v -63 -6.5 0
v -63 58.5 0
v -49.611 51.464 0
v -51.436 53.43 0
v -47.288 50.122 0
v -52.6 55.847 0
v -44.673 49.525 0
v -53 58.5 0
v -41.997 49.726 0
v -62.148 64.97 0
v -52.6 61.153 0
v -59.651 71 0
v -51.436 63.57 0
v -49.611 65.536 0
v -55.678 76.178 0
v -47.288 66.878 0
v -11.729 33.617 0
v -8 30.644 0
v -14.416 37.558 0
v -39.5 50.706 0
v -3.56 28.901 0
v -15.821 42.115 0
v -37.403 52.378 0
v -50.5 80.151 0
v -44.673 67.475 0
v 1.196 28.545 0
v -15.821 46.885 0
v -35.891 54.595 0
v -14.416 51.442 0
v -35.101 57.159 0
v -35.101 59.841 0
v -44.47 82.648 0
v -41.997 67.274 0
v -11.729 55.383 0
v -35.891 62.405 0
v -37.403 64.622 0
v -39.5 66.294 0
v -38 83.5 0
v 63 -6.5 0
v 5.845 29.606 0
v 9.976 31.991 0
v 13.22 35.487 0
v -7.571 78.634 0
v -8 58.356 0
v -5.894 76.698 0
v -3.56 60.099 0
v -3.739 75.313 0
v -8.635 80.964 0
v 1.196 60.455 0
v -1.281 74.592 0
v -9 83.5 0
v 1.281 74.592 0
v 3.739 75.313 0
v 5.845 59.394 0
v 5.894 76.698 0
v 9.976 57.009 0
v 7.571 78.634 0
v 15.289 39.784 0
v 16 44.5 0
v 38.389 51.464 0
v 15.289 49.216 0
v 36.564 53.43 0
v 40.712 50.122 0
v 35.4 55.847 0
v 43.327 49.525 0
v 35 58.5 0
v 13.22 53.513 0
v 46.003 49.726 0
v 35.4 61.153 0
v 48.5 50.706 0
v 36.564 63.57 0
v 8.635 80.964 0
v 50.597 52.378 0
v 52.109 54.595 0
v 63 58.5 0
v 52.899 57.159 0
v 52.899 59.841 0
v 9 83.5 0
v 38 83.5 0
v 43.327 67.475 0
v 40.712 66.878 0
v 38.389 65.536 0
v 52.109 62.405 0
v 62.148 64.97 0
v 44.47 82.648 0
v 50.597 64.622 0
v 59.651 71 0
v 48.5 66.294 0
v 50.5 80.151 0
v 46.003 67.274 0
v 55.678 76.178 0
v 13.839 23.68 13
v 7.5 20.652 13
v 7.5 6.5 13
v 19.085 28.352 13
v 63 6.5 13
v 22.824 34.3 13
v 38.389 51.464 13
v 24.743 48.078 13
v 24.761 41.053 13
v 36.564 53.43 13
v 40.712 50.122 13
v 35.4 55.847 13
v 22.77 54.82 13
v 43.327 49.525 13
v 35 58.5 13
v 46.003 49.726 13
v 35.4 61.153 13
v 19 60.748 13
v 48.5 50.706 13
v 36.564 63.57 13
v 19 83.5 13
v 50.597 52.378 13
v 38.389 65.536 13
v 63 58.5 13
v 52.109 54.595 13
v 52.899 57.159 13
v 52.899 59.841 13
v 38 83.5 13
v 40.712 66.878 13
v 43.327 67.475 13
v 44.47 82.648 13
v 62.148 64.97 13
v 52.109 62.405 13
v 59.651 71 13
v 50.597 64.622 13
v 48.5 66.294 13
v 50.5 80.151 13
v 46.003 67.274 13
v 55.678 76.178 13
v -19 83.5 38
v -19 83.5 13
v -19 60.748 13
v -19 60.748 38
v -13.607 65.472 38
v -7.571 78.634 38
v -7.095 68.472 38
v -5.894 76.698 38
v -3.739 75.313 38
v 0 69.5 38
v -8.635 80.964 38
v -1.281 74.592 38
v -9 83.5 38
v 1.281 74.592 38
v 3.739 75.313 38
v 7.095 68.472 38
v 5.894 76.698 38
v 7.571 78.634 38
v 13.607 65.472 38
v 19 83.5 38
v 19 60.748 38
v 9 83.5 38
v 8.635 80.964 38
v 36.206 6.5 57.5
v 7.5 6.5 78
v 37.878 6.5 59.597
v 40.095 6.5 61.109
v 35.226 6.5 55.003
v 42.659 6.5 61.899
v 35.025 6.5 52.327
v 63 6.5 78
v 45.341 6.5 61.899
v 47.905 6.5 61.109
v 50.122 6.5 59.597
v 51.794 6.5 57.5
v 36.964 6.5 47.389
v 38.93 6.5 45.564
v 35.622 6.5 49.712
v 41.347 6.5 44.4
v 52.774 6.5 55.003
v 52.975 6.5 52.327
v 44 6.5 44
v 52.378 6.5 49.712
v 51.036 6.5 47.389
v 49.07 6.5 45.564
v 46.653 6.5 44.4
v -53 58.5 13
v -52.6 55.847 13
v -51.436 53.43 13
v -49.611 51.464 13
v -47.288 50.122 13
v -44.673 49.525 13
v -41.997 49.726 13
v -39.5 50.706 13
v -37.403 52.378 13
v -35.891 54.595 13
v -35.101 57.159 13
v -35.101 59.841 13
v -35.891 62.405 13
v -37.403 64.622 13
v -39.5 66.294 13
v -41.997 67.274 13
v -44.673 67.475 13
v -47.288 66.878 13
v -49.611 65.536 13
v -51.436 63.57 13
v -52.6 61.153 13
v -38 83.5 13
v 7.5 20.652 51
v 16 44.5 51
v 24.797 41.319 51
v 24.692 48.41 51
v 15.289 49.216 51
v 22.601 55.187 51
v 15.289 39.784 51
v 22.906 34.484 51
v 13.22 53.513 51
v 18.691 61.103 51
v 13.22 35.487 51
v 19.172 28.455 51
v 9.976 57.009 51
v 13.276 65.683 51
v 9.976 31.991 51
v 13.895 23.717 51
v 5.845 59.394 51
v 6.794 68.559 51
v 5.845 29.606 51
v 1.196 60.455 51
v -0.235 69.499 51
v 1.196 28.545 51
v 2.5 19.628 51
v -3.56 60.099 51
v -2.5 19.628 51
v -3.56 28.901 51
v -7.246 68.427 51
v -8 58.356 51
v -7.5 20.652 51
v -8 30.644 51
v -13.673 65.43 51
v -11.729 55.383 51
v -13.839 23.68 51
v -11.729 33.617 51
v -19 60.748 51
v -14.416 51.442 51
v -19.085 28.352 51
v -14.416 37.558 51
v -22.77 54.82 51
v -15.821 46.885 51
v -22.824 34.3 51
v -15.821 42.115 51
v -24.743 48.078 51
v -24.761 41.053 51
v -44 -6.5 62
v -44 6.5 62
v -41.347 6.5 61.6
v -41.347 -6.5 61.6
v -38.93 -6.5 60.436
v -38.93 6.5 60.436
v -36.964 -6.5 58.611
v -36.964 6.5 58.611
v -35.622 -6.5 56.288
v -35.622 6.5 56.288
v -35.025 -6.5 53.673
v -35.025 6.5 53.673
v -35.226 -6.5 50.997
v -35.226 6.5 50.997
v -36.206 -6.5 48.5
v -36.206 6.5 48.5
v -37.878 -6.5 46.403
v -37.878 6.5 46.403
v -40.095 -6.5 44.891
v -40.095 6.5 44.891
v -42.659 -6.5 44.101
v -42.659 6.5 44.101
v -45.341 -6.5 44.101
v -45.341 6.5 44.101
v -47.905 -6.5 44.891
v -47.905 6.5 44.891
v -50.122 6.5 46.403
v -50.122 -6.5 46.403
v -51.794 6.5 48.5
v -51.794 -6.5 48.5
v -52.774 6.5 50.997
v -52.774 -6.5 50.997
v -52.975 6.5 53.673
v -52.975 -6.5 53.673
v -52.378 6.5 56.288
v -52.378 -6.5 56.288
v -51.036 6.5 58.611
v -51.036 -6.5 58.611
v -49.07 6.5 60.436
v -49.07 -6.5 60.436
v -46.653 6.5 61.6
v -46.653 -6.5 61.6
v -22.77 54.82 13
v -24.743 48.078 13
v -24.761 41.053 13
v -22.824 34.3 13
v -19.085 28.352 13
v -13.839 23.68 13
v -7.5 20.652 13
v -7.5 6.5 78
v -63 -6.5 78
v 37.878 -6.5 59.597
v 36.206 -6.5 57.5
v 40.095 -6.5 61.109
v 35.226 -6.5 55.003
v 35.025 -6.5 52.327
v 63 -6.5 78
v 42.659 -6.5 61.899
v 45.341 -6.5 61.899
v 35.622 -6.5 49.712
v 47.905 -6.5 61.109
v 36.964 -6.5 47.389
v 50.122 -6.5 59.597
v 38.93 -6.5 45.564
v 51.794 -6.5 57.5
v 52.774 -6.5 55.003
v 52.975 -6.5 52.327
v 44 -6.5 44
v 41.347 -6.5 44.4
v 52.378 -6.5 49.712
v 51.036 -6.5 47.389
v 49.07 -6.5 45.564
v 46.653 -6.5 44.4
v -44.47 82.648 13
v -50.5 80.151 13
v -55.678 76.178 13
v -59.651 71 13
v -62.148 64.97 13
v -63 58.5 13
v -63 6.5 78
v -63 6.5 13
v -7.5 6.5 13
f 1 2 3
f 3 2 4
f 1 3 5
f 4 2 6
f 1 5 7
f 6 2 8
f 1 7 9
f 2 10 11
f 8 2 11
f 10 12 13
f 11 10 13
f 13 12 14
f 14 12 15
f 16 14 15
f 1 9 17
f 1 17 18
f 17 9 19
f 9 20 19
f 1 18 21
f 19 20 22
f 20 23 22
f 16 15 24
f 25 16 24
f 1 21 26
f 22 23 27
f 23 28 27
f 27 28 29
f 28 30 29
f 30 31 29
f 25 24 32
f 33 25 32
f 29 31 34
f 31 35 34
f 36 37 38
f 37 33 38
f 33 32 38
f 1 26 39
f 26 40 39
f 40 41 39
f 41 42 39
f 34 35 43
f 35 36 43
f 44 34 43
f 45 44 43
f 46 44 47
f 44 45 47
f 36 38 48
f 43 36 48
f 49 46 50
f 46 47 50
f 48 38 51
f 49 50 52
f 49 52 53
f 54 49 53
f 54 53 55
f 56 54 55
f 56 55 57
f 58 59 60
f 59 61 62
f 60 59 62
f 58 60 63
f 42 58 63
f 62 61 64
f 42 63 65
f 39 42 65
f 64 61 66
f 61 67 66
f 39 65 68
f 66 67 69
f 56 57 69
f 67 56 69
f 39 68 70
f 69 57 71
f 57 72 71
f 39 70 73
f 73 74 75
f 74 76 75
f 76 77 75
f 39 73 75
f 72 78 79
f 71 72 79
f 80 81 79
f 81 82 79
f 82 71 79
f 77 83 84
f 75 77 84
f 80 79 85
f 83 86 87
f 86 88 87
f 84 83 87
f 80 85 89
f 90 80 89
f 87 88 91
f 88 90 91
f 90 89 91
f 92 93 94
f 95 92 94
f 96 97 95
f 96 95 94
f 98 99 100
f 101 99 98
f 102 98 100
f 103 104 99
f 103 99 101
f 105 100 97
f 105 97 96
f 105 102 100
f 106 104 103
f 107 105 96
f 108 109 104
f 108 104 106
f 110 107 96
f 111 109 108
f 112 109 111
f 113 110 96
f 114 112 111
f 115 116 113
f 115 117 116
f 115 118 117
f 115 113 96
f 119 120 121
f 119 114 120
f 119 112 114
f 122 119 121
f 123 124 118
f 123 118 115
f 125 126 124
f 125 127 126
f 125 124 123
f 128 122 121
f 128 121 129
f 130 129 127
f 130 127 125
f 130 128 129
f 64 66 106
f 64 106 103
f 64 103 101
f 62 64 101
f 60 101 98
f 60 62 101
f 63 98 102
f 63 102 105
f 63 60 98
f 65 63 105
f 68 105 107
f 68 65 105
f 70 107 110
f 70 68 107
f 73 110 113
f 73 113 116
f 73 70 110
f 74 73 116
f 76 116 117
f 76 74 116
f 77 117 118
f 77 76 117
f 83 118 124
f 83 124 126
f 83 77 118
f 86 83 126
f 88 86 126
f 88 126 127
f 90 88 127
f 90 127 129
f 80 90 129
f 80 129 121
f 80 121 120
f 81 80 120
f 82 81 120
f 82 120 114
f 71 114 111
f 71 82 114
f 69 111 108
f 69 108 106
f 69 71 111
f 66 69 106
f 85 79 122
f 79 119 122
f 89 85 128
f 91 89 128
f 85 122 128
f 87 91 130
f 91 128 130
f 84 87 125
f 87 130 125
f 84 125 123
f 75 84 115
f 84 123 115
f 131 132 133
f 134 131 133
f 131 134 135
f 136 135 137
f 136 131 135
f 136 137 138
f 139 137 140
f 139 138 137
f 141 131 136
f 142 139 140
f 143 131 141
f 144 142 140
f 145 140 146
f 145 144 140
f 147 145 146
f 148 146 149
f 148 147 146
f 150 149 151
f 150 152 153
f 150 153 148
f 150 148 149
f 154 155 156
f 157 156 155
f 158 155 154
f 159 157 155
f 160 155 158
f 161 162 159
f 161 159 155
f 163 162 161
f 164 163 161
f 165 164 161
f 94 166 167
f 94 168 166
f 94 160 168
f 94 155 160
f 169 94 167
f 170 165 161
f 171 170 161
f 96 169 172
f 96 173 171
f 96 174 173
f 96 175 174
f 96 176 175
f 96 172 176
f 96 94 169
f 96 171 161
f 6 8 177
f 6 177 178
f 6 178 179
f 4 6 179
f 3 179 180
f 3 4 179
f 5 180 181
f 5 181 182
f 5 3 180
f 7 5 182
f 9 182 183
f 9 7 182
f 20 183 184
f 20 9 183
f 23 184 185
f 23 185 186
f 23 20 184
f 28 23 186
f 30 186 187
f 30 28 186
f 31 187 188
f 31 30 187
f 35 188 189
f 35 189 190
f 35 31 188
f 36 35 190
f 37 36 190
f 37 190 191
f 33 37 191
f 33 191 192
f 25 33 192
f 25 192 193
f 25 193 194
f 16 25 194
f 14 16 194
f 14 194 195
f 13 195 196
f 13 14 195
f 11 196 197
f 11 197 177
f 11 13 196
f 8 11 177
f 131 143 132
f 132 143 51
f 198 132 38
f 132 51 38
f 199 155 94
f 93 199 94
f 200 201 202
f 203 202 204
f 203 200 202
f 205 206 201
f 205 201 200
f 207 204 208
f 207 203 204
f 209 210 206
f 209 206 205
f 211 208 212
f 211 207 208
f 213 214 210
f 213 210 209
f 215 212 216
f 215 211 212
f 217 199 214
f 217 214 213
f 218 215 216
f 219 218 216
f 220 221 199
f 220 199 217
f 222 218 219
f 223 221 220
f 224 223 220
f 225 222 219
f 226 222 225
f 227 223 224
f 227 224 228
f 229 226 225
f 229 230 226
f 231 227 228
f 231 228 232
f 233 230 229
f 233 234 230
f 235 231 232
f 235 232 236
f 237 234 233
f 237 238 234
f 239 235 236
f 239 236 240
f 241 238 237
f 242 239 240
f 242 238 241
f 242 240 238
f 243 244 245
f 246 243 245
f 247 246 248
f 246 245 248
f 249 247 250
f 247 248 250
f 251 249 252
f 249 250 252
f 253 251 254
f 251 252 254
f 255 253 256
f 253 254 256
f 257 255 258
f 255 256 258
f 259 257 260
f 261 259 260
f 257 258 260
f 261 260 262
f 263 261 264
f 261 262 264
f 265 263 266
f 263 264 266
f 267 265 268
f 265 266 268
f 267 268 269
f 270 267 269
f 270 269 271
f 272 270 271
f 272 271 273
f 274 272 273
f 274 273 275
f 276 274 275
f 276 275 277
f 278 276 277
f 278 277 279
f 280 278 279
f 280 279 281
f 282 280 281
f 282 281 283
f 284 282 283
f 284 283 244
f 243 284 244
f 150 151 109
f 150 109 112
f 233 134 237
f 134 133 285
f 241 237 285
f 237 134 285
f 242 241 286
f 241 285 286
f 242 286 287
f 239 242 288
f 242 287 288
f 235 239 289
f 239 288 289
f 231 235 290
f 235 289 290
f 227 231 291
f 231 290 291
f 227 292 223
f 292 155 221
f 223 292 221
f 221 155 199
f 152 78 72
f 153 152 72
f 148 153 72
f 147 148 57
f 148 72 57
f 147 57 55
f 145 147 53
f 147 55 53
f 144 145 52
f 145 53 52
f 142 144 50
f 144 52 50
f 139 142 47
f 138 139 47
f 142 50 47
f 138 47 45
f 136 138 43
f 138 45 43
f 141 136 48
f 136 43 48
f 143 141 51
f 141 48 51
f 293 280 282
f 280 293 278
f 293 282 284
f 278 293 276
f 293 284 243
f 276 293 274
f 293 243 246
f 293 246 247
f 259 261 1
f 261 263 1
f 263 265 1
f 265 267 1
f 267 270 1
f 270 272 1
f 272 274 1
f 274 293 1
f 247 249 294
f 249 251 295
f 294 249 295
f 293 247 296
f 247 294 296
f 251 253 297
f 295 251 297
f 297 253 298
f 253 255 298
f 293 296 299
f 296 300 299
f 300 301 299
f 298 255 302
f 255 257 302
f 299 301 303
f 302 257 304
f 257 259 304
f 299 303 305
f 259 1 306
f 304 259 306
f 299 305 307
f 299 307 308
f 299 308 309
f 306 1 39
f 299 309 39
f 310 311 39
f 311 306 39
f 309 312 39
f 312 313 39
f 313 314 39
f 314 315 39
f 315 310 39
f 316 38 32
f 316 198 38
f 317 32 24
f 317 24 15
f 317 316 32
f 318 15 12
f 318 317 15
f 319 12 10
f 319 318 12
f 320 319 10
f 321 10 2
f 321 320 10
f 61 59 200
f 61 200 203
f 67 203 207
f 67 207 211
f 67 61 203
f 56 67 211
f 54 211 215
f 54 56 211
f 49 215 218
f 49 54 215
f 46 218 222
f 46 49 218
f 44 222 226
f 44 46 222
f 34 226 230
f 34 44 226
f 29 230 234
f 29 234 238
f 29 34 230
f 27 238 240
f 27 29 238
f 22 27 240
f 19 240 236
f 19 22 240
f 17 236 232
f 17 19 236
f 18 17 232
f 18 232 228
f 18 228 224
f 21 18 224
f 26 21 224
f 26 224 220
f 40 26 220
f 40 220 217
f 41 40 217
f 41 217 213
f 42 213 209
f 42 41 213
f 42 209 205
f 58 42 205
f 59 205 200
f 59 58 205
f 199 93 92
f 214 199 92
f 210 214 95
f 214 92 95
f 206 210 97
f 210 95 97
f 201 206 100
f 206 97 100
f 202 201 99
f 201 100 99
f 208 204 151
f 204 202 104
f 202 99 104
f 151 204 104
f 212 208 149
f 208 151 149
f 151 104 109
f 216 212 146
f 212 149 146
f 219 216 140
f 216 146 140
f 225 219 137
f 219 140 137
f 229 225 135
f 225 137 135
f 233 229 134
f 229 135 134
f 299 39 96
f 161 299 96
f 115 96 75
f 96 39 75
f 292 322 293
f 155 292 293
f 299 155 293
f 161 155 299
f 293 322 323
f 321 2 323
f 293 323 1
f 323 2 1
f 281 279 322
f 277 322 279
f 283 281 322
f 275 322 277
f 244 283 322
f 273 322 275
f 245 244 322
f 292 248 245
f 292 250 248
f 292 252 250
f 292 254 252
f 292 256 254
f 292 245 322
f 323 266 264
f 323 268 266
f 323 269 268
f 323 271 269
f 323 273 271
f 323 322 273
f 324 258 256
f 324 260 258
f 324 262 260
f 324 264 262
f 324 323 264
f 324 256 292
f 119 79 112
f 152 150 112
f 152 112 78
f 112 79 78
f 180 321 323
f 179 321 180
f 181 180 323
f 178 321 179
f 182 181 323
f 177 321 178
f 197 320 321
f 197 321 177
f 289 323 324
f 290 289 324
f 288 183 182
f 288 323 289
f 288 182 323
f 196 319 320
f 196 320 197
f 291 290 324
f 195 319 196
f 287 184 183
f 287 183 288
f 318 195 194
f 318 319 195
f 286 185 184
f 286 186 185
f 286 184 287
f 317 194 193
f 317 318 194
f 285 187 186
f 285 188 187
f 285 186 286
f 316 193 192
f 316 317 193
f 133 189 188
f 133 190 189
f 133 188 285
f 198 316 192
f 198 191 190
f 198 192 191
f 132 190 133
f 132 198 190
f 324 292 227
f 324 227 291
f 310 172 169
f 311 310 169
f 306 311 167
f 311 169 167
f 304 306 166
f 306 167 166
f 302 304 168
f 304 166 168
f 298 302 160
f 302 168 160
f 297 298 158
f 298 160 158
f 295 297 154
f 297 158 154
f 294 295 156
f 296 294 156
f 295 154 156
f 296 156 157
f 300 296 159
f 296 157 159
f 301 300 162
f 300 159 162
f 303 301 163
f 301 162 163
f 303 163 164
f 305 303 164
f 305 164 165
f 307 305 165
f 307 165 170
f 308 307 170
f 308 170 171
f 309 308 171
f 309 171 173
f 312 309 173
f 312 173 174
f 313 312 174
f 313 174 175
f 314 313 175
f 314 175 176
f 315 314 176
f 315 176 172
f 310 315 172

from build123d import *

# Parameters (mm, degrees)
SKETCH1_W           = 126
SKETCH1_H           = 13
BOSS_EXTRUDE1_DEPTH = 78
SKETCH1_3_R         = 9
BOSS_EXTRUDE2_DEPTH = 13
SKETCH1_4_R         = 25
SKETCH1_4_R_2       = 16
BOSS_EXTRUDE3_DEPTH = 51
BOSS_EXTRUDE4_DEPTH = 38
SKETCH2_R           = 9
CUT_EXTRUDE1_DEPTH  = 127.419935137
FILLET1_R           = 25


with BuildPart() as part:
    # Sketch1 → Boss-Extrude1 (new body)
    with BuildSketch(Plane.XY):
        Rectangle(SKETCH1_W, SKETCH1_H)
    extrude(amount=BOSS_EXTRUDE1_DEPTH)

    # Sketch1<3> → Boss-Extrude2 (add)
    with BuildSketch(Plane.XY):
        with BuildLine():
            Line((-63, 83.5), (-63, 6.5))
            Line((-63, 6.5), (63, 6.5))
            Line((63, 6.5), (63, 83.5))
            Line((63, 83.5), (19, 83.5))
            Line((19, 83.5), (19, 60.748076809))
            ThreePointArc((19, 60.748076809), (23.452078799, 53.160254038), (25, 44.5))
            ThreePointArc((25, 44.5), (-8.660254038, 21.047921201), (-19, 60.748076809))
            Line((-19, 60.748076809), (-19, 83.5))
            Line((-19, 83.5), (-63, 83.5))
        make_face()
        with Locations(Location((-44, 58.5, 0), (0, 0, 180))):
            Circle(SKETCH1_3_R, mode=Mode.SUBTRACT)
        with Locations(Location((44, 58.5, 0), (0, 0, 180))):
            Circle(SKETCH1_3_R, mode=Mode.SUBTRACT)
    extrude(amount=BOSS_EXTRUDE2_DEPTH)

    # Sketch1<4> → Boss-Extrude3 (add)
    with BuildSketch(Plane.XY):
        with Locations(Location((0, 44.5, 0), (0, 0, 139.464197889))):
            Circle(SKETCH1_4_R)
        with Locations((0, 44.5)):
            Circle(SKETCH1_4_R_2, mode=Mode.SUBTRACT)
    extrude(amount=BOSS_EXTRUDE3_DEPTH)

    # Sketch1<5> → Boss-Extrude4 (add)
    with BuildSketch(Plane.XY):
        with BuildLine():
            Line((-9, 83.5), (-19, 83.5))
            Line((-19, 83.5), (-19, 60.748076809))
            ThreePointArc((-19, 60.748076809), (0, 69.5), (19, 60.748076809))
            Line((19, 60.748076809), (19, 83.5))
            Line((19, 83.5), (9, 83.5))
            ThreePointArc((9, 83.5), (0, 74.5), (-9, 83.5))
        make_face()
    extrude(amount=BOSS_EXTRUDE4_DEPTH)

    # Sketch2 → Cut-Extrude1 (cut, through all)
    with BuildSketch(Plane(origin=(0, 6.5, 0), x_dir=(1, 0, 0), z_dir=(0, 1, 0))):
        with Locations(Location((-44, -53, 0), (0, 0, 270))):
            Circle(SKETCH2_R)
        with Locations(Location((44, -53, 0), (0, 0, 90))):
            Circle(SKETCH2_R)
    extrude(amount=-CUT_EXTRUDE1_DEPTH, mode=Mode.SUBTRACT)

    # Fillet1
    fillet1_edges = [part.edges().sort_by_distance(p)[0] for p in [
        (-63, 83.5, 6.5),
        (63, 83.5, 6.5),
    ]]
    fillet(fillet1_edges, radius=FILLET1_R)

    # Sketch4 → Loft4 section 0
    with BuildSketch(Plane(origin=(-7.5, 0, 0), x_dir=(0, 0, -1), z_dir=(1, 0, 0))):
        with BuildLine():
            Line((-78, 6.5), (-51, 20.651519965))
            Line((-51, 20.651519965), (-13, 20.651519965))
            Line((-13, 20.651519965), (-13, 6.5))
            Line((-13, 6.5), (-78, 6.5))
        make_face()
    # Sketch6 → Loft4 section 1
    with BuildSketch(Plane(origin=(0, 0, 0), x_dir=(0, 0, -1), z_dir=(1, 0, 0))):
        with BuildLine():
            Line((-78, 6.5), (-51, 19.5))
            Line((-51, 19.5), (-13, 19.5))
            Line((-13, 19.5), (-13, 6.5))
            Line((-13, 6.5), (-78, 6.5))
        make_face()
    # Sketch5 → Loft4 section 2
    with BuildSketch(Plane(origin=(7.5, 0, 0), x_dir=(0, 0, -1), z_dir=(1, 0, 0))):
        with BuildLine():
            Line((-78, 6.5), (-51, 20.651519965))
            Line((-51, 20.651519965), (-13, 20.651519965))
            Line((-13, 20.651519965), (-13, 6.5))
            Line((-13, 6.5), (-78, 6.5))
        make_face()
    loft()


solid = part.part
